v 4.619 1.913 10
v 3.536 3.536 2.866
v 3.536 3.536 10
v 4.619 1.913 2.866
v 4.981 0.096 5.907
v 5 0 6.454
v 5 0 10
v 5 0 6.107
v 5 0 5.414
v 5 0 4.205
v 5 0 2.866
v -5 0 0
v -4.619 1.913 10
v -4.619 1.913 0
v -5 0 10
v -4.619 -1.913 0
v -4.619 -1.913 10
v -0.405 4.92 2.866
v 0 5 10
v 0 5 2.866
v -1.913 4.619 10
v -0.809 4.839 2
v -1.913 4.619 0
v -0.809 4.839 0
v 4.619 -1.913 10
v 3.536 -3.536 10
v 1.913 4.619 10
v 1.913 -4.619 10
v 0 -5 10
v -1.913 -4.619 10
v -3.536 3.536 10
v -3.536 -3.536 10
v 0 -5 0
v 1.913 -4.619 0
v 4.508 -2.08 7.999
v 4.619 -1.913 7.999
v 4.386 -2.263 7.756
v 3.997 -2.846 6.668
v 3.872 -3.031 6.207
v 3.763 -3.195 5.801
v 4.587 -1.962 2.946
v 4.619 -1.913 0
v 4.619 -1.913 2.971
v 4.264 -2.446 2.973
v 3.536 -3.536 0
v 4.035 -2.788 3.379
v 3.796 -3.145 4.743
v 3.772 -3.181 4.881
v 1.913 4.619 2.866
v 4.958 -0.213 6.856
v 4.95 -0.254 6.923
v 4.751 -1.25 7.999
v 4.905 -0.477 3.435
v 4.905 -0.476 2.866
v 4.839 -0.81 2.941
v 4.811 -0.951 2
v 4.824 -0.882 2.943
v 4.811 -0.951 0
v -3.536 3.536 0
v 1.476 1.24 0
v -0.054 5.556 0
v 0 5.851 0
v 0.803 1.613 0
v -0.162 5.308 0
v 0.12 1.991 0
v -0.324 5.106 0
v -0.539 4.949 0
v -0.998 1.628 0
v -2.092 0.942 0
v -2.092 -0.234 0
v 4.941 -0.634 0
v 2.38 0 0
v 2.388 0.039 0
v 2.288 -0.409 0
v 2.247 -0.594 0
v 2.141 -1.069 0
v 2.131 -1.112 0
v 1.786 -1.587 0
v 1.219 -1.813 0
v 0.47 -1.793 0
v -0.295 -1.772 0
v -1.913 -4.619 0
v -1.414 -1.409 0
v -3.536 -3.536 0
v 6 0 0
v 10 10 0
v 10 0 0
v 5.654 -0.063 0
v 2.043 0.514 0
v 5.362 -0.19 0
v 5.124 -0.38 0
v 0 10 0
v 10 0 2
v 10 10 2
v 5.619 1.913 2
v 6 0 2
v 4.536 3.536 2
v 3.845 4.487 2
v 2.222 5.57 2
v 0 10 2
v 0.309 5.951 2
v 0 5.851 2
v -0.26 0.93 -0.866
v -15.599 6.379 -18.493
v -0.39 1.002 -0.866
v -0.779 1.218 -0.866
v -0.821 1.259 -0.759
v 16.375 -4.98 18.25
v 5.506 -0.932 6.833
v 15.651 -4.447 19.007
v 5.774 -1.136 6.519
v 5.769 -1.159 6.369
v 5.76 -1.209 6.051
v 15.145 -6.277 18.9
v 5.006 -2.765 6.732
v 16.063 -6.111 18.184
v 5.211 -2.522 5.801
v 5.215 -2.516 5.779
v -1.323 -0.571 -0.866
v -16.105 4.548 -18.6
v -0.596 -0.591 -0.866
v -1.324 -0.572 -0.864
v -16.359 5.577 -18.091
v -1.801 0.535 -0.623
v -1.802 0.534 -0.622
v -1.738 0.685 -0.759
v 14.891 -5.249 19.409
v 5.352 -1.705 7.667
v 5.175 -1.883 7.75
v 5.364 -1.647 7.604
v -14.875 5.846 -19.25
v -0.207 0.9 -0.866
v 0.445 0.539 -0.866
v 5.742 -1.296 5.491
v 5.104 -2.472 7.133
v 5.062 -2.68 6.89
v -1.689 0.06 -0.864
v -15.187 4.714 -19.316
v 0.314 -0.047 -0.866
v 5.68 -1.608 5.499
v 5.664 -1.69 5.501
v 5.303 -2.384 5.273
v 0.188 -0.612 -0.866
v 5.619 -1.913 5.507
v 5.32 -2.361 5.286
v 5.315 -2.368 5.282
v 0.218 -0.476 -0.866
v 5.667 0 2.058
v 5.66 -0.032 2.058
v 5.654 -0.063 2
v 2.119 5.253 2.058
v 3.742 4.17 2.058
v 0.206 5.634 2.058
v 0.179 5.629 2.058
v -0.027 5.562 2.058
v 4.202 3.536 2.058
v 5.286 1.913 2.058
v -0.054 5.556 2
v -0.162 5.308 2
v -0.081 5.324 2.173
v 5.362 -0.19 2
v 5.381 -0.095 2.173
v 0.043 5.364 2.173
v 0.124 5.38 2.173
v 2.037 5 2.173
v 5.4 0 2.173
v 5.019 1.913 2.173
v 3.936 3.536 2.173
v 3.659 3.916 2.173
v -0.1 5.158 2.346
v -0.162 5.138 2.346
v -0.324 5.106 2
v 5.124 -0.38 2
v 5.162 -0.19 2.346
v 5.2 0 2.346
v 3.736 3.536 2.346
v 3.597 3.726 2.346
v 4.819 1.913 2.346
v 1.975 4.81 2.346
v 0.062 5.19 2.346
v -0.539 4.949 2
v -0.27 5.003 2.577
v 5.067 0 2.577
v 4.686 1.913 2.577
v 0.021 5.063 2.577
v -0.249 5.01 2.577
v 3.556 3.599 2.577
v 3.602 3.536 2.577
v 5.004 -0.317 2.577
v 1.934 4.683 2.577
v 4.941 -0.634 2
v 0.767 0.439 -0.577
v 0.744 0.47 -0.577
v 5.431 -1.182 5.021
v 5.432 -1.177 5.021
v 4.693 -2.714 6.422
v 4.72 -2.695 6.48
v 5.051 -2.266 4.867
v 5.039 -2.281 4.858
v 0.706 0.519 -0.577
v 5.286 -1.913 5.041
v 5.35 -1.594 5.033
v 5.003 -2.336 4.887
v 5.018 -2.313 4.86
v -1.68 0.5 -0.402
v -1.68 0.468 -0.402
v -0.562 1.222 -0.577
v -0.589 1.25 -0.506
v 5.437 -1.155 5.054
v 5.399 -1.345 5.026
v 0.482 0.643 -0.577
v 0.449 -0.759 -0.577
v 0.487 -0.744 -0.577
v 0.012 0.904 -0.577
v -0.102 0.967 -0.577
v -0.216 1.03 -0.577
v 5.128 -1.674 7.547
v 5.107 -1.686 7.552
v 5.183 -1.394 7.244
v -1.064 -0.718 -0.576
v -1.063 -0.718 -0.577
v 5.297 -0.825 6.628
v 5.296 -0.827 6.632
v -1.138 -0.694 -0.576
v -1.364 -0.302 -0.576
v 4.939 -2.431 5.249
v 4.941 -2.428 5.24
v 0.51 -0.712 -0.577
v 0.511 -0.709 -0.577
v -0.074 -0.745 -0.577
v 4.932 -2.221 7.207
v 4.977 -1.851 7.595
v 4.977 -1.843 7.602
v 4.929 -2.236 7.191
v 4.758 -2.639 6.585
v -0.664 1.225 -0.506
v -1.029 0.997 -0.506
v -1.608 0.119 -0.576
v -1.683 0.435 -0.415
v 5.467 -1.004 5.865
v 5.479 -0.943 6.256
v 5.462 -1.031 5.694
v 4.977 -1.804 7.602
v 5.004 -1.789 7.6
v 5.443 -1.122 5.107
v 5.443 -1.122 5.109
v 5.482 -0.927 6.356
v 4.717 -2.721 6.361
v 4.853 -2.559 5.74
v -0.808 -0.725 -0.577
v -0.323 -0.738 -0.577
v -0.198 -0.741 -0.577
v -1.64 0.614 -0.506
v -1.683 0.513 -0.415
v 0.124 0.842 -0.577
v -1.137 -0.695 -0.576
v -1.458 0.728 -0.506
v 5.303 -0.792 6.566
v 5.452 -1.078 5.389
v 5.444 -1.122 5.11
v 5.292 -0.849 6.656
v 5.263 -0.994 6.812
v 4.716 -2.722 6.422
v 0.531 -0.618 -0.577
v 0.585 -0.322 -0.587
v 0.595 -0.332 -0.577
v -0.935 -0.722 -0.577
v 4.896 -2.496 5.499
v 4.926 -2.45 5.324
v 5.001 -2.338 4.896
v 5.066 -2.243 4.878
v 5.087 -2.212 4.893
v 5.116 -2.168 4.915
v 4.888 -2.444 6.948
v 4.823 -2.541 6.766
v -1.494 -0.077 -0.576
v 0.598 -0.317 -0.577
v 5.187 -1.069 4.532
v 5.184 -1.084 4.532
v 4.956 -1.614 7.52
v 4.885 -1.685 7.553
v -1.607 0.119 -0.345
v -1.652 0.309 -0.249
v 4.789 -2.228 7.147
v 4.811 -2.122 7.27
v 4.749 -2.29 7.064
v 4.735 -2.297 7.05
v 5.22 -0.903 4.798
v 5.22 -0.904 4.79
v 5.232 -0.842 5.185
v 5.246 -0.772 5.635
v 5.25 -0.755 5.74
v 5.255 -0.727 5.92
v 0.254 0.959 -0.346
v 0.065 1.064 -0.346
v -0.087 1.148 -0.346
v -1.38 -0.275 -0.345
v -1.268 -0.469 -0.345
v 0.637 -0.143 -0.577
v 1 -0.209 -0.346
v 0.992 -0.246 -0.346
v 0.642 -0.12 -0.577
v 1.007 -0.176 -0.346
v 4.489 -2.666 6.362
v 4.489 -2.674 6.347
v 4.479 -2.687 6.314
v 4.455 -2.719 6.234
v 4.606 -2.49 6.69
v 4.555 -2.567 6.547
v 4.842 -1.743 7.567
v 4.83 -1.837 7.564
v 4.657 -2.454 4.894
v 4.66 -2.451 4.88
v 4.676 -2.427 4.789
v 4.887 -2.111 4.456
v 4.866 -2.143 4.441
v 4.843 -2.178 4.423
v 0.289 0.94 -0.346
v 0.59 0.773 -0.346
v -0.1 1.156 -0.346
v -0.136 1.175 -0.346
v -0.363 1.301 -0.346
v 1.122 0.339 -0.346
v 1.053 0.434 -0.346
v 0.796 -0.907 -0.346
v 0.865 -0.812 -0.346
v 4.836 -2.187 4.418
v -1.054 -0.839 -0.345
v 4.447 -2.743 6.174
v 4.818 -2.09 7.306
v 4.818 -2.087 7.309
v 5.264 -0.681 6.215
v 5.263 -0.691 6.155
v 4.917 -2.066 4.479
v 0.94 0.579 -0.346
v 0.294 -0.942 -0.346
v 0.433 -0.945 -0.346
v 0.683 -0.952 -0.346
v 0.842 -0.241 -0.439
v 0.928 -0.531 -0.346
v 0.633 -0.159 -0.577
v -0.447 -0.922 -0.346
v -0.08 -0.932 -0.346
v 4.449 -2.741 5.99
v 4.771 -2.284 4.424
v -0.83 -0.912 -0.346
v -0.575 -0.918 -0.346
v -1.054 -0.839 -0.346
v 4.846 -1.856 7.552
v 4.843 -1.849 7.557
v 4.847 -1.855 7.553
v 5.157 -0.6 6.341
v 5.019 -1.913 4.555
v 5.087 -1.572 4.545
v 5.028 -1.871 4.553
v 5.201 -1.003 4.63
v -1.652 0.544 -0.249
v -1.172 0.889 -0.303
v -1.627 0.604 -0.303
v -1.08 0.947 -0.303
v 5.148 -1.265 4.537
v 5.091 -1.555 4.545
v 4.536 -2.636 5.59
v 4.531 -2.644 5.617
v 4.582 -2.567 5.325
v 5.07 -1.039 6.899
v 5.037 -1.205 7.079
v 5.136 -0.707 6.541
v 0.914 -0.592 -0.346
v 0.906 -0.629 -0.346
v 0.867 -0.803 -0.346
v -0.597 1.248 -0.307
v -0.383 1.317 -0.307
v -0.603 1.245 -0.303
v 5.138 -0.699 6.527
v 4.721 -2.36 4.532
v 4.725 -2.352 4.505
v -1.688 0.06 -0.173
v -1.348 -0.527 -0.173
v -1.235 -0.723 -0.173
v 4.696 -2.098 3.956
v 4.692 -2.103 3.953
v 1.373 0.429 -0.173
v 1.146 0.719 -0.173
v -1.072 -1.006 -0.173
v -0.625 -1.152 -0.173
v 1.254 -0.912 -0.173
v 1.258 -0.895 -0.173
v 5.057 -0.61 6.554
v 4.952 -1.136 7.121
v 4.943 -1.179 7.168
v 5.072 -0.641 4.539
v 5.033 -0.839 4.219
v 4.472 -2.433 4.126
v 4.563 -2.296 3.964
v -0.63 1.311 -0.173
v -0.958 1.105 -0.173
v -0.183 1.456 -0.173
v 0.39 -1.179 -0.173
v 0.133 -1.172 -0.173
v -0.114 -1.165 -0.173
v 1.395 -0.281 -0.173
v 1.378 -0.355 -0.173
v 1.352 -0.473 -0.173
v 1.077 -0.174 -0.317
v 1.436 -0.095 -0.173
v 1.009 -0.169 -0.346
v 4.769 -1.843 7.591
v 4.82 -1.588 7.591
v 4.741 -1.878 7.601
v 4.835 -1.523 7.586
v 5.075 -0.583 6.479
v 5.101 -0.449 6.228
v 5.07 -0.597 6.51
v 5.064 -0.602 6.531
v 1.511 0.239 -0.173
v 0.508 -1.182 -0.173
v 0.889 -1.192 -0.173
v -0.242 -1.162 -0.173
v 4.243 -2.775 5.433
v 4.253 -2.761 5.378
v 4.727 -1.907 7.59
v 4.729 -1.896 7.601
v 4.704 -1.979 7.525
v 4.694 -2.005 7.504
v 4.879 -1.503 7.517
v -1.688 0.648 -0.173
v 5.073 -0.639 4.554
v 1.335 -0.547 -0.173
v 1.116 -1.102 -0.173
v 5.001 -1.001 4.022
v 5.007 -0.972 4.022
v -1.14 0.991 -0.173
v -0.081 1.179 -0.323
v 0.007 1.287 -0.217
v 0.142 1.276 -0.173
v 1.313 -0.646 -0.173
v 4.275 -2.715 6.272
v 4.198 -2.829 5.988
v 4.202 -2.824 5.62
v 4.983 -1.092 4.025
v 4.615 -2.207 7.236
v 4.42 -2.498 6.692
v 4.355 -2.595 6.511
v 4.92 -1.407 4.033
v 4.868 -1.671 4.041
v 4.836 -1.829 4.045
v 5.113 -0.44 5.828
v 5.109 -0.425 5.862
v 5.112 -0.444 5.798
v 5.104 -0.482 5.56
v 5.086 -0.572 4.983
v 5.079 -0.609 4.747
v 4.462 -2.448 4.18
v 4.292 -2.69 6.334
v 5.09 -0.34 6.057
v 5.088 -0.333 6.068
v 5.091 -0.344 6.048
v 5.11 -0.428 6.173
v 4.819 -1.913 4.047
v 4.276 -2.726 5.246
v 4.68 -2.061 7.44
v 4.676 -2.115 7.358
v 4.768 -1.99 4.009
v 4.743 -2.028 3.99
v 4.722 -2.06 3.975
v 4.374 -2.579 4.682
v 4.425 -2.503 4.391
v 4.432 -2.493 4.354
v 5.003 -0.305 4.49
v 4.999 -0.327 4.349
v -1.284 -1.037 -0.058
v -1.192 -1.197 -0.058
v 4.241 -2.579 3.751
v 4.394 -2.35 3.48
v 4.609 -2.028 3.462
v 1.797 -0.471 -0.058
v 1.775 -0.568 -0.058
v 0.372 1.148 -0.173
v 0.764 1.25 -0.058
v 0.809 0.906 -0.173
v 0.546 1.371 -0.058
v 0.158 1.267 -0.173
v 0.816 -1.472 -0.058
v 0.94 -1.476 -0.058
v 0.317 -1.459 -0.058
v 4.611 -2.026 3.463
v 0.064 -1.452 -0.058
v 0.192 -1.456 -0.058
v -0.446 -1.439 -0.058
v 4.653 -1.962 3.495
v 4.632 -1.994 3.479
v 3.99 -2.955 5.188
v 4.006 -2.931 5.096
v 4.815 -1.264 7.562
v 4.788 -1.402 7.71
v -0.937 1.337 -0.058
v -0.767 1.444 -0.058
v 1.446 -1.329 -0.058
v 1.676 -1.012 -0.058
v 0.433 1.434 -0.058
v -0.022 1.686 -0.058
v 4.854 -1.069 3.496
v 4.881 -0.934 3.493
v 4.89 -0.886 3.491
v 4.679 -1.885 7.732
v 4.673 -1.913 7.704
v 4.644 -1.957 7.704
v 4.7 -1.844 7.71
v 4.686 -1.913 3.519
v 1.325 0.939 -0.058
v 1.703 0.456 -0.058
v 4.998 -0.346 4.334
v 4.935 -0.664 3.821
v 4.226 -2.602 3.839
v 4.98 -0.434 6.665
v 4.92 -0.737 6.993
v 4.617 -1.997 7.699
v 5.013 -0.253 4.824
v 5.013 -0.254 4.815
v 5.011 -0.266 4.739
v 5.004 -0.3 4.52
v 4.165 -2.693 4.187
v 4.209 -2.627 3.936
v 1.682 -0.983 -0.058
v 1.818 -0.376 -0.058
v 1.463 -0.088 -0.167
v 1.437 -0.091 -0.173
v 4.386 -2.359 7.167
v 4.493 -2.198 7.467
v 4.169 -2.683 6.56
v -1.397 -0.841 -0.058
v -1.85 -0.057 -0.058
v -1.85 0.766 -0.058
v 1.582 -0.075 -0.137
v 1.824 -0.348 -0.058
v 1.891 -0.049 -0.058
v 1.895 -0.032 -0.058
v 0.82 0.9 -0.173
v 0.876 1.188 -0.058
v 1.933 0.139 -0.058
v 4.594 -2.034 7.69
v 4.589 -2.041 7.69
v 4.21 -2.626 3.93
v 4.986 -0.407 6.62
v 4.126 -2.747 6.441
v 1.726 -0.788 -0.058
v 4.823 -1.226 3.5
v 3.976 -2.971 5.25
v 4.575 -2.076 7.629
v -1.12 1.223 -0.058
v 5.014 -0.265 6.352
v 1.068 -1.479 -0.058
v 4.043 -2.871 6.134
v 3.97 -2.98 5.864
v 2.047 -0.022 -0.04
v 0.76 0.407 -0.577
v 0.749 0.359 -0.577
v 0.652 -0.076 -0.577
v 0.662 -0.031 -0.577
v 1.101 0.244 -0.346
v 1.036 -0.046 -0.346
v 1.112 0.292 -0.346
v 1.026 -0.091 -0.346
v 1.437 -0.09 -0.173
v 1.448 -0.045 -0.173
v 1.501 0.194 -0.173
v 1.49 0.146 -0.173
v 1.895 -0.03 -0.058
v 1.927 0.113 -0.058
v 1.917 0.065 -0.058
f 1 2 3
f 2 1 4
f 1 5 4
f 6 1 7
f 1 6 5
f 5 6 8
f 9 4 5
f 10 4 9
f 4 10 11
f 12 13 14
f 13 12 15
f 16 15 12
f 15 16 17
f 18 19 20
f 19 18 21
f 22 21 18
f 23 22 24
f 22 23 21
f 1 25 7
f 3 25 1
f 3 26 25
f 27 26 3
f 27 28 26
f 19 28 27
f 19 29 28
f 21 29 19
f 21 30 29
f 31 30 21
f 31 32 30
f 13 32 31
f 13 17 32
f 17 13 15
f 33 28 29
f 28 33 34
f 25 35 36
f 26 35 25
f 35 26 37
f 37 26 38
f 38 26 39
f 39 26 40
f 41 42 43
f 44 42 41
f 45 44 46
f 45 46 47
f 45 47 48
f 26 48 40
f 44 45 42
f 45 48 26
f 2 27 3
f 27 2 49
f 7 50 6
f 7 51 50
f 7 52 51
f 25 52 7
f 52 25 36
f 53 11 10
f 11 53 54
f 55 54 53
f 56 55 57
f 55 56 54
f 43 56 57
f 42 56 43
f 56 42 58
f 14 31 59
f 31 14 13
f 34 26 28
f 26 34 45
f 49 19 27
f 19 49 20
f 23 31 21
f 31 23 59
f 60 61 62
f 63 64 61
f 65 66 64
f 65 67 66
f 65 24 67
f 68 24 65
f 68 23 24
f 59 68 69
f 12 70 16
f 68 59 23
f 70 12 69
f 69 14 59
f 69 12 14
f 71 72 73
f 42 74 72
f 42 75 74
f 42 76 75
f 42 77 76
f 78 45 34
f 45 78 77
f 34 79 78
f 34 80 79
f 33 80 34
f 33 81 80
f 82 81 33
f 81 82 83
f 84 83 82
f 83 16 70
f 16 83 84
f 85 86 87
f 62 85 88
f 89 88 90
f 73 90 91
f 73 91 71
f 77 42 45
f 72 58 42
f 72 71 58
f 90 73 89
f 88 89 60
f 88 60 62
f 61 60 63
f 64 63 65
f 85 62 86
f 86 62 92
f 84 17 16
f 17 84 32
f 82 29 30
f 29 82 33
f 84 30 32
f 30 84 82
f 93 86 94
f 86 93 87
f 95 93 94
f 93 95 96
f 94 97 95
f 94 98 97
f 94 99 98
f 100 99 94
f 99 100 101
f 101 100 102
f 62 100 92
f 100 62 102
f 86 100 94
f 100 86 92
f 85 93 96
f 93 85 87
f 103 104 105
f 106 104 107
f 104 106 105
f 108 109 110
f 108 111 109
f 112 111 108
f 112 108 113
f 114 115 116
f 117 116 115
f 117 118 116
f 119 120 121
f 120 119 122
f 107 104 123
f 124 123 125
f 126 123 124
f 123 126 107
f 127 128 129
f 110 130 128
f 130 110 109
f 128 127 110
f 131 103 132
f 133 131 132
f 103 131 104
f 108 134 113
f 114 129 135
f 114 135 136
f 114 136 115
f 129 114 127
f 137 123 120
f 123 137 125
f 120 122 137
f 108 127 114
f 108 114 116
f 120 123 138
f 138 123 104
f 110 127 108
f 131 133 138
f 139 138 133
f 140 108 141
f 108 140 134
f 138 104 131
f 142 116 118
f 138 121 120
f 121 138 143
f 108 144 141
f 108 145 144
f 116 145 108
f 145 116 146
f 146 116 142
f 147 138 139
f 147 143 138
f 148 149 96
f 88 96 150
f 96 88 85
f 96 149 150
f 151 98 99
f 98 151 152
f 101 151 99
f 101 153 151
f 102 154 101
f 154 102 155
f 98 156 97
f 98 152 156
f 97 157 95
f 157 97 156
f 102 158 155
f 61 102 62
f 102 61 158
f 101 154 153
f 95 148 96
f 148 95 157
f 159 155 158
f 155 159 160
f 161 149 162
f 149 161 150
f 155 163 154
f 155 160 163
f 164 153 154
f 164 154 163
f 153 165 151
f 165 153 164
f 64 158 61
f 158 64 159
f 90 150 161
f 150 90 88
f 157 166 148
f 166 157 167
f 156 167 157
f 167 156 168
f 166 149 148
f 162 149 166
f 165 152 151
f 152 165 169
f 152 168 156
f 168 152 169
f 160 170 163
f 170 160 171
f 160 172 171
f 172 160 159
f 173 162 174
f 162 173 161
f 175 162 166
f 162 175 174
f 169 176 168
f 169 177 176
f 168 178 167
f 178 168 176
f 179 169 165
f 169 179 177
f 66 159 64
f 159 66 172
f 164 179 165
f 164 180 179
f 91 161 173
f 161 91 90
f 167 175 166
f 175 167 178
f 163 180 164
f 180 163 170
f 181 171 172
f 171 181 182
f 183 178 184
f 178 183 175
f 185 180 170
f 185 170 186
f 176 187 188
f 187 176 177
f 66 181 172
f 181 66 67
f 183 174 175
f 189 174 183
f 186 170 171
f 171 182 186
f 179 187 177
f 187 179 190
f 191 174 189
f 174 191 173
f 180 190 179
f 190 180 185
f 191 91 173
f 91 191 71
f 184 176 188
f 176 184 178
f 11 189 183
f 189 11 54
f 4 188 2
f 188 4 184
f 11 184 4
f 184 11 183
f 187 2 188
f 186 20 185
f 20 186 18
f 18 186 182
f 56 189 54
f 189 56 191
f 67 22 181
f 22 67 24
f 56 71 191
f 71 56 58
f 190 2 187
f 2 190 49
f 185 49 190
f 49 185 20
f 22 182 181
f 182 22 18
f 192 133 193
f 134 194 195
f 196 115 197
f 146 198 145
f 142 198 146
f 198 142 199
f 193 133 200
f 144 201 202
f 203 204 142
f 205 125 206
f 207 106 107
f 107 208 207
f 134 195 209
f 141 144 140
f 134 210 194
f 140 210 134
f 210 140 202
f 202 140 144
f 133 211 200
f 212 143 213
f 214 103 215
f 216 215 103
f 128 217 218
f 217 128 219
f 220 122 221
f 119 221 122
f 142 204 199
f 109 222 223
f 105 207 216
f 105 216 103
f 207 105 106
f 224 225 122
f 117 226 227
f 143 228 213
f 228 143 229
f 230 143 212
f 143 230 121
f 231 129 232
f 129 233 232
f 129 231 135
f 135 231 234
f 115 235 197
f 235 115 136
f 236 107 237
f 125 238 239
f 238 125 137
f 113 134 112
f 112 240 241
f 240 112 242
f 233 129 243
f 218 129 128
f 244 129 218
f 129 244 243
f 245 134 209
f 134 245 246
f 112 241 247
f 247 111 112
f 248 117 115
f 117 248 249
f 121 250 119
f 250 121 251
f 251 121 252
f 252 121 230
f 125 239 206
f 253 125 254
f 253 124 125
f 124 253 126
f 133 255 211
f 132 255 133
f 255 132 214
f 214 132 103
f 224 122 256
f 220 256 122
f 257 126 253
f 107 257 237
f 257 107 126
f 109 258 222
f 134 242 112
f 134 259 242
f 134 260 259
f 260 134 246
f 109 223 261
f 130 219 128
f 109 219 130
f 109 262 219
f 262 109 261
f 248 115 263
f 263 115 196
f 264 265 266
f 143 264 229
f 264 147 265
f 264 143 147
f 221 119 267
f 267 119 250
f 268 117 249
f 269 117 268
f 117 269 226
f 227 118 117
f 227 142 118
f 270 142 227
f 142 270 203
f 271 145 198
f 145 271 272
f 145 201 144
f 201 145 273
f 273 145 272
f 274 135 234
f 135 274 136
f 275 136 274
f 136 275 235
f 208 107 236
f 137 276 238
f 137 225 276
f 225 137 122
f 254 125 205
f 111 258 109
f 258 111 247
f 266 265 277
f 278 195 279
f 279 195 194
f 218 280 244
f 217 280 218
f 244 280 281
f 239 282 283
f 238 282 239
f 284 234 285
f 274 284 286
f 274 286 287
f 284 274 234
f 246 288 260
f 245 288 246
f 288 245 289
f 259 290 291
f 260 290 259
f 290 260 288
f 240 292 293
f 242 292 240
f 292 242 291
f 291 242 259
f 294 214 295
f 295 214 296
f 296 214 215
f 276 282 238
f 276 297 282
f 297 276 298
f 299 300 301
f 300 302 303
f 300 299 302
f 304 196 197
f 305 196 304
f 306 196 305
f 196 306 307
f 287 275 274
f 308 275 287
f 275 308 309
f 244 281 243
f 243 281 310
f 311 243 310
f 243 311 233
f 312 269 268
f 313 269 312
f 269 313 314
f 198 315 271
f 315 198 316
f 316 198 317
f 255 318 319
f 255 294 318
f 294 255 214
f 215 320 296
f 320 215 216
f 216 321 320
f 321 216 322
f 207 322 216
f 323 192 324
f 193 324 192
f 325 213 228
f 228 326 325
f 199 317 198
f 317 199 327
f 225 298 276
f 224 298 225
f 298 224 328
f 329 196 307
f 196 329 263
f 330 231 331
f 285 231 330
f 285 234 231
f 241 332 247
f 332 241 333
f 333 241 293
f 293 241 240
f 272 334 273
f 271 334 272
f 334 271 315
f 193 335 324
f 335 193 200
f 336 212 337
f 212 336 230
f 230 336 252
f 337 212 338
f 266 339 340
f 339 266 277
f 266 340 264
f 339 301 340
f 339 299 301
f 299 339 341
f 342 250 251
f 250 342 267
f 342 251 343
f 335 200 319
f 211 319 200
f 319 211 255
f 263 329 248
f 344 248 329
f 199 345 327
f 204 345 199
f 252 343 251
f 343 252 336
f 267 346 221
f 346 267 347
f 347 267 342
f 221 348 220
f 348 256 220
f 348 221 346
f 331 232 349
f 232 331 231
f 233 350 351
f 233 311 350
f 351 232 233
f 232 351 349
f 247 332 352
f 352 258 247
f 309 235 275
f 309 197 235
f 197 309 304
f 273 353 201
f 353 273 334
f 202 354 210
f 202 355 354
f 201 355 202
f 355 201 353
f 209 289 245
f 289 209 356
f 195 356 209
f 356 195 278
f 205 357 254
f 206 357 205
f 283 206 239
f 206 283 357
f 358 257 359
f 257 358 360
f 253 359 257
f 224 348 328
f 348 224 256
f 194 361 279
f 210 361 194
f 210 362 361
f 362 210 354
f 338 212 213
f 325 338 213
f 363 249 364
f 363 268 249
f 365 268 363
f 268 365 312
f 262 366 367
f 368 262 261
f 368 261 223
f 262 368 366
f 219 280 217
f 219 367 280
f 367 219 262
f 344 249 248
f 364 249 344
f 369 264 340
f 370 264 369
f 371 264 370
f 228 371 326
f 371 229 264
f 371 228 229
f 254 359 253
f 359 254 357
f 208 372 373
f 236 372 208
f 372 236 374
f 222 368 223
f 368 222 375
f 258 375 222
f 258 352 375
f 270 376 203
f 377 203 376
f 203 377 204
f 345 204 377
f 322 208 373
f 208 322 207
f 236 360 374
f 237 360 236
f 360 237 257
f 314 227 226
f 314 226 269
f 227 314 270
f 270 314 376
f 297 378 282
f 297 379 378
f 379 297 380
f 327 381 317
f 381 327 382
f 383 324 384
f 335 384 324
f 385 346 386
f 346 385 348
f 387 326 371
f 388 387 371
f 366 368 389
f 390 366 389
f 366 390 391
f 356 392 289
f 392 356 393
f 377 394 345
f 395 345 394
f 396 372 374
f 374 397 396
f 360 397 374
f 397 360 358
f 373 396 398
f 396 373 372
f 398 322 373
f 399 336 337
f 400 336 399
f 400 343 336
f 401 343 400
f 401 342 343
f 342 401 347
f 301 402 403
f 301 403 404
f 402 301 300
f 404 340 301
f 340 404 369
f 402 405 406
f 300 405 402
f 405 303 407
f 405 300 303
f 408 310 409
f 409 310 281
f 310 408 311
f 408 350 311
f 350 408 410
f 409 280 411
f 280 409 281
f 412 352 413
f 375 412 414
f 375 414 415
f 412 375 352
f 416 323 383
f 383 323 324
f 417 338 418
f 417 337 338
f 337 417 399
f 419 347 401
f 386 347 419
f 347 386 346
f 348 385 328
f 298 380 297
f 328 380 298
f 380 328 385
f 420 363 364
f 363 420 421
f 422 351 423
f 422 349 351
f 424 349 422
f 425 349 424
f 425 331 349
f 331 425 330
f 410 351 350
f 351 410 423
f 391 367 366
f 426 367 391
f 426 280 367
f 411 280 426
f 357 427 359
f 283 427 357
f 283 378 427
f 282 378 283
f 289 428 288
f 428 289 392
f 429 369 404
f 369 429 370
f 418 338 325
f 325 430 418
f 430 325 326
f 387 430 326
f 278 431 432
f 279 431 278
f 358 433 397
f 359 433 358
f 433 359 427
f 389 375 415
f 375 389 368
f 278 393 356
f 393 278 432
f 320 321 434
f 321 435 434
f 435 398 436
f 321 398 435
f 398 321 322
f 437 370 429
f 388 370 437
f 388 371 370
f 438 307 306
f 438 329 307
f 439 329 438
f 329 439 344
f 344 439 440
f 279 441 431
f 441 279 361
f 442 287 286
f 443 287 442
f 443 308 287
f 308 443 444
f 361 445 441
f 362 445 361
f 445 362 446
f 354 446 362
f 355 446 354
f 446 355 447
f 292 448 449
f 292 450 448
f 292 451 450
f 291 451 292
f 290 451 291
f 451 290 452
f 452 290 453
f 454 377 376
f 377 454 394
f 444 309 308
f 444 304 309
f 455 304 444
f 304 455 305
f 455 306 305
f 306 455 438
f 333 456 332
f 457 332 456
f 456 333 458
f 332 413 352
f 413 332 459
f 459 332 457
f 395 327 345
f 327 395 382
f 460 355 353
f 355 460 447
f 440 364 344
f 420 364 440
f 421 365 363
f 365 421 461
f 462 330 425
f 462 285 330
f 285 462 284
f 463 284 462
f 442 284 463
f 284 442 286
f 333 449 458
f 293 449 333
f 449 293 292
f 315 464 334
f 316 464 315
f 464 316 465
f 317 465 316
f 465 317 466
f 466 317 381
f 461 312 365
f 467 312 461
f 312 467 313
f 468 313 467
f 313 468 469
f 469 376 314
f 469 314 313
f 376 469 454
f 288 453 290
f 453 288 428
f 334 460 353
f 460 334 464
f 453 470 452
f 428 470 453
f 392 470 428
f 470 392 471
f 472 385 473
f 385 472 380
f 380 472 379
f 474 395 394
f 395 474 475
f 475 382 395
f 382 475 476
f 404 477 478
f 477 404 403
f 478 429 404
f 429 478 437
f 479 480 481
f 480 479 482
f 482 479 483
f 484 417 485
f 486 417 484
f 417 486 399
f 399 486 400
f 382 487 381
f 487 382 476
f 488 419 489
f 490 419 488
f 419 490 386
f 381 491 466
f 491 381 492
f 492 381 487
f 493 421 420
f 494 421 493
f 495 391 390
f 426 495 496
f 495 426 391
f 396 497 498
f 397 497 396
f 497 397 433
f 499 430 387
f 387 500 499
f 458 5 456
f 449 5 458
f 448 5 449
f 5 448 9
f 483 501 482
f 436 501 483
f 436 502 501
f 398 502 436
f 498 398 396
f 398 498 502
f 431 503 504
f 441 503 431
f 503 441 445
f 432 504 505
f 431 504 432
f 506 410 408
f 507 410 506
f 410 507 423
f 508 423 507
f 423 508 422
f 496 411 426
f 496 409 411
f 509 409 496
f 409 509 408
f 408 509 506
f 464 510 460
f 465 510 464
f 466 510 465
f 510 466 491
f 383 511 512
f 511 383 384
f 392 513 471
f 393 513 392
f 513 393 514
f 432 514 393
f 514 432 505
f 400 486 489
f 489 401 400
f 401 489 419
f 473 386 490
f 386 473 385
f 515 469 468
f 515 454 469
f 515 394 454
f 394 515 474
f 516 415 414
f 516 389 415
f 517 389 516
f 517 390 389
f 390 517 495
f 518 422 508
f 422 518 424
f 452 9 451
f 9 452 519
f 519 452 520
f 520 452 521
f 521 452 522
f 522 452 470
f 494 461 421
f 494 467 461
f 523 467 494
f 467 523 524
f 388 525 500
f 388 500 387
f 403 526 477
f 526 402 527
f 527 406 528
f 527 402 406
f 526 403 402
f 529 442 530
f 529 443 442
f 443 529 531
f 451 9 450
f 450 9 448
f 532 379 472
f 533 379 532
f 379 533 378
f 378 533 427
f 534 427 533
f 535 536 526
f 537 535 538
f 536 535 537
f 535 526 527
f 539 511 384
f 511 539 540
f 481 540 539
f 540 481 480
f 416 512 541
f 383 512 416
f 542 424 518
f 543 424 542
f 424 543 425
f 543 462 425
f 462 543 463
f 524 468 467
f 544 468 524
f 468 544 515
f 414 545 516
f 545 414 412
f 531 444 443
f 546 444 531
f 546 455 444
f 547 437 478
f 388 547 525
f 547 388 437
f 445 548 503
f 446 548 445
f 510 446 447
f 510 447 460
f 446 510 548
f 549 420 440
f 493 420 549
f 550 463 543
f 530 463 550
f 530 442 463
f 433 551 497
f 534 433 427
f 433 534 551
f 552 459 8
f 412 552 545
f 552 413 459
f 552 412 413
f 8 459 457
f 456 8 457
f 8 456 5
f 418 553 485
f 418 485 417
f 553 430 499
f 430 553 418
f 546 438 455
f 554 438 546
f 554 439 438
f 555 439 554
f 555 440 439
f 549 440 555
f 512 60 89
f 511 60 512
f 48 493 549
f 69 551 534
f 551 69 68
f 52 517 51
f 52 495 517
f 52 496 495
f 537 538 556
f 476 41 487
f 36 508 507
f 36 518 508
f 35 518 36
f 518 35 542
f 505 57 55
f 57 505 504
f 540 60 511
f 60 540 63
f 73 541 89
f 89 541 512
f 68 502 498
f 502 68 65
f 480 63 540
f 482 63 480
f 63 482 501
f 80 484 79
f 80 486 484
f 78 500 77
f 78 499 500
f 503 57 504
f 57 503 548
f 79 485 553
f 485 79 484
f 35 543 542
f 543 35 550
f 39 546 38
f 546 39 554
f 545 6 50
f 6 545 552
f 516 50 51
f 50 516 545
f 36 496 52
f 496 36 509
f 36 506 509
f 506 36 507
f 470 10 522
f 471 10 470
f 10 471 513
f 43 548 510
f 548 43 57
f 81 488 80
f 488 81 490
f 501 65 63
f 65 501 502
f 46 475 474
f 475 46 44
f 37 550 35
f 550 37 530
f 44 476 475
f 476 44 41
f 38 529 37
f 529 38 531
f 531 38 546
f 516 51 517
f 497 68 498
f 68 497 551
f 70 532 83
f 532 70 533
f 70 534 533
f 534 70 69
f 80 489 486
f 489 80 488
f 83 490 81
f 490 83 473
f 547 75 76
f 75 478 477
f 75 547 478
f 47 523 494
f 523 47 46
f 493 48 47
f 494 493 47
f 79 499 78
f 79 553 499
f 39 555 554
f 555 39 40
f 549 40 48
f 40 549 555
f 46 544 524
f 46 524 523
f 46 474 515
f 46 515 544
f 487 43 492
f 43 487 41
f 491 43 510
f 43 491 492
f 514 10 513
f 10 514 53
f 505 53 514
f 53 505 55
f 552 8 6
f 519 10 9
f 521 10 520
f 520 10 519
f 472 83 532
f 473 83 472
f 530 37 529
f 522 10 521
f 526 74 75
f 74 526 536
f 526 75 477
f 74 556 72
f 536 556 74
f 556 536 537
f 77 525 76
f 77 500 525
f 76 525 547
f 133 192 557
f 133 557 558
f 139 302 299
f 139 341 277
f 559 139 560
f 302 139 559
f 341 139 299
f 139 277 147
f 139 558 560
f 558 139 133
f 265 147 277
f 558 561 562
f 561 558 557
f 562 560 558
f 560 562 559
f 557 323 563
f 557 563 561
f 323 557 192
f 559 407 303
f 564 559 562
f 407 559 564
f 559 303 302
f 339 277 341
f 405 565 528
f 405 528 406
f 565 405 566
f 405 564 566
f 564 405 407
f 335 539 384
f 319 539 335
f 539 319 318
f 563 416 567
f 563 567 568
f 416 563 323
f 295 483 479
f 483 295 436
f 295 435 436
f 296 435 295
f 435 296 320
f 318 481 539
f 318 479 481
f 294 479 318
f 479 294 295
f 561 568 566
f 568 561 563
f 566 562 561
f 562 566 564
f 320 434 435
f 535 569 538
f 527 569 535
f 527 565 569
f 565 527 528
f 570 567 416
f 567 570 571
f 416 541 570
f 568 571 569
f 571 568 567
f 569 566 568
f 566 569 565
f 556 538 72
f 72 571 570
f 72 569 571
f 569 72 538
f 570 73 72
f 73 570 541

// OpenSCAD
// Fillet function

module fillet(r=1.0,steps=3,include=true) {
  if(include) for (k=[0:$children-1]) {
	children(k);
  }
  for (i=[0:$children-2] ) {
    for(j=[i+1:$children-1] ) {
	fillet_two(r=r,steps=steps) {
	  children(i);
	  children(j);
	  intersection() {
		children(i);
		children(j);
	  }
	}
    }
  }
}

module fillet_two(r=1.0,steps=3) {
  for(step=[1:steps]) {
	hull() {
	  render() intersection() {
		children(0);
		minkowski() {
			children(2);
			sphere(r=r*step/steps);
		}
	  }
	  render() intersection() {
		children(1);
		minkowski() {
			children(2);
			sphere(r=r*(steps-step+1)/steps);
		}
	  }
	}
  }
}

fillet(r=1,steps=5) {
	cylinder(r=5,h=10);
	cube([10,10,2]);
	rotate([30,30,30]) cylinder(r=1.0,h=50,center=true);
}
